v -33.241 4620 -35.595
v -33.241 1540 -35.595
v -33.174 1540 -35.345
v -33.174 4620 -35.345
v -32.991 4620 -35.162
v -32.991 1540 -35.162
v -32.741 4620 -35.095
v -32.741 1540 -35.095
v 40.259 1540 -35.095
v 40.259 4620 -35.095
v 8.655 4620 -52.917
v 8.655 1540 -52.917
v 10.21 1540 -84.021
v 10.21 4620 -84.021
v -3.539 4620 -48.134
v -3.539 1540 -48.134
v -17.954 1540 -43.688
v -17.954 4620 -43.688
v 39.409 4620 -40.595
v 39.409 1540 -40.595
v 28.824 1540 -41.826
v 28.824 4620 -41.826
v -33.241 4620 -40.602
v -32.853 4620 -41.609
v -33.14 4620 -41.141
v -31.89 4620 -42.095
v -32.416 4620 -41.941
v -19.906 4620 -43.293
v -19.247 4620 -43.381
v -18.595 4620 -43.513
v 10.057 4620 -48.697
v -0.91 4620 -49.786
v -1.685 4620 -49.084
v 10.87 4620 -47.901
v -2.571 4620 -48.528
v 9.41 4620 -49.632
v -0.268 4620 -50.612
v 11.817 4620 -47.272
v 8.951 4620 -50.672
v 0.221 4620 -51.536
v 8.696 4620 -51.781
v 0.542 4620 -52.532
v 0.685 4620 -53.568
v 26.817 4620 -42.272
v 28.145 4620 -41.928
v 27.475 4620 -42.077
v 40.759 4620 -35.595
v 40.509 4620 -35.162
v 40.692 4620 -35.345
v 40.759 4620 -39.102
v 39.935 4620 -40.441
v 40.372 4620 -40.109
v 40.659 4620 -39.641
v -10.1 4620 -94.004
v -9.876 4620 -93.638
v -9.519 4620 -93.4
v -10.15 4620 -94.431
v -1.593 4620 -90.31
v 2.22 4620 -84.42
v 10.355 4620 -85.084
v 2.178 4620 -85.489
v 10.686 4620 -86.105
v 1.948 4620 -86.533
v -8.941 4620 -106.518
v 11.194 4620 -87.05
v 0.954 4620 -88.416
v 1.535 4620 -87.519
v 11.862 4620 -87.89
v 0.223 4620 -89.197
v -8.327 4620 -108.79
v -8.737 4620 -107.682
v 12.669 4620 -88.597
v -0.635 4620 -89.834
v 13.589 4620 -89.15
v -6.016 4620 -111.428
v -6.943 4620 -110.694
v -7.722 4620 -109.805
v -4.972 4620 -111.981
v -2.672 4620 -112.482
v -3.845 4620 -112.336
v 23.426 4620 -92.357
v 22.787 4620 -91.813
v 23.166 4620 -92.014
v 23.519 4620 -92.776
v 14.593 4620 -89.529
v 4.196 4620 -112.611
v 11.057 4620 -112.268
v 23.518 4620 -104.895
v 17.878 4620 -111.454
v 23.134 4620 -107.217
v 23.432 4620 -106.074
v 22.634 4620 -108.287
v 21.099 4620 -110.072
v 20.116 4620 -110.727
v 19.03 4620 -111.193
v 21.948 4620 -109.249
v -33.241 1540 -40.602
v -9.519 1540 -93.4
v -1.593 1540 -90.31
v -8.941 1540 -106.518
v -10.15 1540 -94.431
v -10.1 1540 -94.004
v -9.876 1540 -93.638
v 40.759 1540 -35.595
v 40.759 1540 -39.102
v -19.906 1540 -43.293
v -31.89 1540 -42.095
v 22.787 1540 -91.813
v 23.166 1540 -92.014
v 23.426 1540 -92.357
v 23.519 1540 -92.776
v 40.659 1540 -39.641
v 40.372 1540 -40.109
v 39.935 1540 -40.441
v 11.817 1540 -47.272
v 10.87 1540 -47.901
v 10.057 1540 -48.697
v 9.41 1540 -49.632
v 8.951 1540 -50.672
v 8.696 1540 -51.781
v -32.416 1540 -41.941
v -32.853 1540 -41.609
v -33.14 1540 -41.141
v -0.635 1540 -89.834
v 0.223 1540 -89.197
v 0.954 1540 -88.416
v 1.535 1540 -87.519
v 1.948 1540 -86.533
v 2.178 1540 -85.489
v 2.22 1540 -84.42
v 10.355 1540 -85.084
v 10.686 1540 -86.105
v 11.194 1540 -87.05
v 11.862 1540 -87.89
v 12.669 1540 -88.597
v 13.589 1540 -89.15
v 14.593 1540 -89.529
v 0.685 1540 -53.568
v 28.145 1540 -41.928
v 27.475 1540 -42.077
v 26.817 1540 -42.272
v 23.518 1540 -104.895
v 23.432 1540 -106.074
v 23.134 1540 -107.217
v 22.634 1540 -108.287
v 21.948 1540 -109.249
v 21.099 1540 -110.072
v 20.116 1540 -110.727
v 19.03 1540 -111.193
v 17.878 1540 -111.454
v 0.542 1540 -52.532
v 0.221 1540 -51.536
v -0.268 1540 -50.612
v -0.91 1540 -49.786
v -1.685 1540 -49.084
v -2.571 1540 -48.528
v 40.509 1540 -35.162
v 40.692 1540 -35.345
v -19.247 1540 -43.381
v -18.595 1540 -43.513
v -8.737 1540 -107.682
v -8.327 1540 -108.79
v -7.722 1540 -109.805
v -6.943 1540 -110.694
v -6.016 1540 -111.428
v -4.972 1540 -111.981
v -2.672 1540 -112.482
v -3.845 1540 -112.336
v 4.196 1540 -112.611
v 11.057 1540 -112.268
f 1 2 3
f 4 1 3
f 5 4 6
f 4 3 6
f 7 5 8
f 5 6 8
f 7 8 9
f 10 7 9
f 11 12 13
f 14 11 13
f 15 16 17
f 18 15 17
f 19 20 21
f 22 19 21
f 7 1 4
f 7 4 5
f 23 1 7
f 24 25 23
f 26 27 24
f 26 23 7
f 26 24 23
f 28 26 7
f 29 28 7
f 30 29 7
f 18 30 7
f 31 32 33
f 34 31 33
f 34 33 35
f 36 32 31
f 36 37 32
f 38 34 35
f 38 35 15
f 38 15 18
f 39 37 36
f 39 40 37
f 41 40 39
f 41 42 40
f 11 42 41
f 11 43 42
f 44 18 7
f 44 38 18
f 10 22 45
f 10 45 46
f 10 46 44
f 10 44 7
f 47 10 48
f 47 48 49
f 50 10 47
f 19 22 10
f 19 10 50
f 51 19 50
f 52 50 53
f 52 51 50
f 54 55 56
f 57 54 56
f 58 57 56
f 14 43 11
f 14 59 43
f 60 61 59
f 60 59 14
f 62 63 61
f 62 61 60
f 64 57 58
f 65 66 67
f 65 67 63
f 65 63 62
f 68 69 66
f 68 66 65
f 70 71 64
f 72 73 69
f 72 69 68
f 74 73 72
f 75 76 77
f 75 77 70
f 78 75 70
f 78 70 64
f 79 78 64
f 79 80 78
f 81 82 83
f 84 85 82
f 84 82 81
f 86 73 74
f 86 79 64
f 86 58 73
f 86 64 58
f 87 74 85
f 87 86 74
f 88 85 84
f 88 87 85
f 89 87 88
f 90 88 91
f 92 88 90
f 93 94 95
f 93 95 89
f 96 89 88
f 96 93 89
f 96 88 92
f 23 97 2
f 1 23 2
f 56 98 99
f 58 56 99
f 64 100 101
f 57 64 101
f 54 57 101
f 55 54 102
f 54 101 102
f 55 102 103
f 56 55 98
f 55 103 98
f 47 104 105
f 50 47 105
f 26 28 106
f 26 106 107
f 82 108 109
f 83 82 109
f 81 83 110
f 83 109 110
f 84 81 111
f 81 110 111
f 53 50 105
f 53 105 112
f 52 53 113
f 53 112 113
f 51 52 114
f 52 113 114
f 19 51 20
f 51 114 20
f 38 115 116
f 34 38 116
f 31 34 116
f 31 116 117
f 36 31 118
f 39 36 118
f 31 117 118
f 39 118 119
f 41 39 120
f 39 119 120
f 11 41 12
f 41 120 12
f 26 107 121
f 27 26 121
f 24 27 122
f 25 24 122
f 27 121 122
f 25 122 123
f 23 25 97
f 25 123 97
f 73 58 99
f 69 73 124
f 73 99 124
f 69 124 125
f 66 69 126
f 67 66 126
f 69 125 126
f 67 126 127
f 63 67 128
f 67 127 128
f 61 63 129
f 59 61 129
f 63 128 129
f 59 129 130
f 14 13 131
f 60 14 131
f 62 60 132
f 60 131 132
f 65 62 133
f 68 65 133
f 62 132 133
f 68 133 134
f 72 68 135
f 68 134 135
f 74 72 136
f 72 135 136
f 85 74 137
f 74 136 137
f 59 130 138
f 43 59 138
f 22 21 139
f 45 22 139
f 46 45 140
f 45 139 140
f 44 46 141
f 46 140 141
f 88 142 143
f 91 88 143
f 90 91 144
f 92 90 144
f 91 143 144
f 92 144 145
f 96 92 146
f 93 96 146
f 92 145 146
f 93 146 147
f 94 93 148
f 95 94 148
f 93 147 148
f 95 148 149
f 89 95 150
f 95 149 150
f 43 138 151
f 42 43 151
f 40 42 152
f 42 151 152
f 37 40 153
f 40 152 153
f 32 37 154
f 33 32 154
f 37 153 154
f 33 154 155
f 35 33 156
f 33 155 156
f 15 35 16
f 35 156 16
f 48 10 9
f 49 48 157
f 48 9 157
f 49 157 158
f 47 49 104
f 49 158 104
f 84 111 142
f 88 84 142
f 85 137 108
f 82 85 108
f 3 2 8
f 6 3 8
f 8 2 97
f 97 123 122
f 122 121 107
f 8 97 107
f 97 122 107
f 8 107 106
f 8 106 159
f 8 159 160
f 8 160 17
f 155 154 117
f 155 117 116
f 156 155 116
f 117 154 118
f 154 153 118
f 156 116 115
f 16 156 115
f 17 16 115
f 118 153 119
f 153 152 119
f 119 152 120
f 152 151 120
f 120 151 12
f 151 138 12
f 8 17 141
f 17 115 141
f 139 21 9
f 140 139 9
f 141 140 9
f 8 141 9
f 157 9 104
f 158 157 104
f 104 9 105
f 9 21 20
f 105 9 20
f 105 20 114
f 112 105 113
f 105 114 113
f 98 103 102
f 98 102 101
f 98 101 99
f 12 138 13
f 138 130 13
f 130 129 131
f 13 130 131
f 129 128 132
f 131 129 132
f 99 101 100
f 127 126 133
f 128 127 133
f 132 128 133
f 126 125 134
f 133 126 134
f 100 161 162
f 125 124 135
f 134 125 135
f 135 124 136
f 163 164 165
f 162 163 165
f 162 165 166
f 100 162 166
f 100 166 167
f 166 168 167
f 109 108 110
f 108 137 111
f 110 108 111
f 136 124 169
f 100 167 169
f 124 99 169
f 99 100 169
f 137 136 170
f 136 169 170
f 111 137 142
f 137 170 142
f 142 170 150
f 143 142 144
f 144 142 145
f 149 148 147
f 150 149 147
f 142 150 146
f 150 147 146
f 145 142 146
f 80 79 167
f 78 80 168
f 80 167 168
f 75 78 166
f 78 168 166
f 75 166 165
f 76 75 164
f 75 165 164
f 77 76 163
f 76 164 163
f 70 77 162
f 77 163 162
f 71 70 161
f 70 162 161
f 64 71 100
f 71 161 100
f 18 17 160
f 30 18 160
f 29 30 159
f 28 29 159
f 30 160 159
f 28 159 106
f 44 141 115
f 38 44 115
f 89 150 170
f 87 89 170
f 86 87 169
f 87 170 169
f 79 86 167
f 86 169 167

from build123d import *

# Parameters (mm, degrees)
BOSS_EXTRUDE1_DEPTH = 6160
SCALE1_SCALE        = 0.5


with BuildPart() as part:
    # Sketch1 → Boss-Extrude1 (new body)
    with BuildSketch(Plane(origin=(0, 0, 0), x_dir=(1, 0, 0), z_dir=(0, 1, 0))):
        with BuildLine():
            Line((76.57, 1), (76.57, 8.014887848))
            ThreePointArc((76.57, 8.014887848), (75.794355641, 10.027905976), (73.868505345, 11))
            Line((73.868505345, 11), (52.699440994, 13.462245993))
            ThreePointArc((52.699440994, 13.462245993), (50.66951347, 13.805020581), (48.685575878, 14.354649366))
            Line((48.685575878, 14.354649366), (18.685575878, 24.354649366))
            ThreePointArc((18.685575878, 24.354649366), (13.871556702, 29.074301457), (12.362010068, 35.644778262))
            Line((12.362010068, 35.644778262), (15.471988543, 97.852031369))
            ThreePointArc((15.471988543, 97.852031369), (18.068983959, 104.780820885), (24.236586355, 108.868997747))
            Line((24.236586355, 108.868997747), (40.625152803, 113.436411952))
            ThreePointArc((40.625152803, 113.436411952), (41.681001919, 114.153421136), (42.088224459, 115.363003431))
            Line((42.088224459, 115.363003431), (42.088077354, 139.600936252))
            ThreePointArc((42.088077354, 139.600936252), (38.946677156, 148.309556467), (30.806533774, 152.719378115))
            ThreePointArc((30.806533774, 152.719378115), (10.309376952, 154.806660207), (-10.293756951, 154.774138824))
            ThreePointArc((-10.293756951, 154.774138824), (-18.835211019, 151.19935214), (-22.830844668, 142.846481426))
            Line((-22.830844668, 142.846481426), (-25.249616021, 118.672382628))
            ThreePointArc((-25.249616021, 118.672382628), (-24.964931452, 117.428427653), (-23.98595767, 116.609843742))
            Line((-23.98595767, 116.609843742), (-8.134655987, 110.430635238))
            ThreePointArc((-8.134655987, 110.430635238), (-2.419976919, 105.771805576), (-0.508053801, 98.650934796))
            Line((-0.508053801, 98.650934796), (-3.579408779, 36.946097875))
            ThreePointArc((-3.579408779, 36.946097875), (-6.090257895, 30.180503672), (-12.02744702, 26.078380623))
            Line((-12.02744702, 26.078380623), (-40.856592509, 17.185955753))
            ThreePointArc((-40.856592509, 17.185955753), (-42.789347985, 16.693858065), (-44.761504941, 16.396703557))
            Line((-44.761504941, 16.396703557), (-68.728511515, 14))
            ThreePointArc((-68.728511515, 14), (-70.654357721, 13.027904294), (-71.43, 11.014888465))
            Line((-71.43, 11.014888465), (-71.43, 1))
            ThreePointArc((-71.43, 1), (-71.137106781, 0.292893219), (-70.43, 0))
            Line((-70.43, 0), (2.57, 0))
            Line((2.57, 0), (75.57, 0))
            ThreePointArc((75.57, 0), (76.277106781, 0.292893219), (76.57, 1))
        make_face()
    extrude(amount=BOSS_EXTRUDE1_DEPTH)


with BuildPart() as part_1:
    # Scale1: scaled about (4.948874478, 3080, -70.189428705)
    add(part.part.scale(SCALE1_SCALE).moved(Location((2.474437239, 1540, -35.094714352))))


solid = part_1.part
